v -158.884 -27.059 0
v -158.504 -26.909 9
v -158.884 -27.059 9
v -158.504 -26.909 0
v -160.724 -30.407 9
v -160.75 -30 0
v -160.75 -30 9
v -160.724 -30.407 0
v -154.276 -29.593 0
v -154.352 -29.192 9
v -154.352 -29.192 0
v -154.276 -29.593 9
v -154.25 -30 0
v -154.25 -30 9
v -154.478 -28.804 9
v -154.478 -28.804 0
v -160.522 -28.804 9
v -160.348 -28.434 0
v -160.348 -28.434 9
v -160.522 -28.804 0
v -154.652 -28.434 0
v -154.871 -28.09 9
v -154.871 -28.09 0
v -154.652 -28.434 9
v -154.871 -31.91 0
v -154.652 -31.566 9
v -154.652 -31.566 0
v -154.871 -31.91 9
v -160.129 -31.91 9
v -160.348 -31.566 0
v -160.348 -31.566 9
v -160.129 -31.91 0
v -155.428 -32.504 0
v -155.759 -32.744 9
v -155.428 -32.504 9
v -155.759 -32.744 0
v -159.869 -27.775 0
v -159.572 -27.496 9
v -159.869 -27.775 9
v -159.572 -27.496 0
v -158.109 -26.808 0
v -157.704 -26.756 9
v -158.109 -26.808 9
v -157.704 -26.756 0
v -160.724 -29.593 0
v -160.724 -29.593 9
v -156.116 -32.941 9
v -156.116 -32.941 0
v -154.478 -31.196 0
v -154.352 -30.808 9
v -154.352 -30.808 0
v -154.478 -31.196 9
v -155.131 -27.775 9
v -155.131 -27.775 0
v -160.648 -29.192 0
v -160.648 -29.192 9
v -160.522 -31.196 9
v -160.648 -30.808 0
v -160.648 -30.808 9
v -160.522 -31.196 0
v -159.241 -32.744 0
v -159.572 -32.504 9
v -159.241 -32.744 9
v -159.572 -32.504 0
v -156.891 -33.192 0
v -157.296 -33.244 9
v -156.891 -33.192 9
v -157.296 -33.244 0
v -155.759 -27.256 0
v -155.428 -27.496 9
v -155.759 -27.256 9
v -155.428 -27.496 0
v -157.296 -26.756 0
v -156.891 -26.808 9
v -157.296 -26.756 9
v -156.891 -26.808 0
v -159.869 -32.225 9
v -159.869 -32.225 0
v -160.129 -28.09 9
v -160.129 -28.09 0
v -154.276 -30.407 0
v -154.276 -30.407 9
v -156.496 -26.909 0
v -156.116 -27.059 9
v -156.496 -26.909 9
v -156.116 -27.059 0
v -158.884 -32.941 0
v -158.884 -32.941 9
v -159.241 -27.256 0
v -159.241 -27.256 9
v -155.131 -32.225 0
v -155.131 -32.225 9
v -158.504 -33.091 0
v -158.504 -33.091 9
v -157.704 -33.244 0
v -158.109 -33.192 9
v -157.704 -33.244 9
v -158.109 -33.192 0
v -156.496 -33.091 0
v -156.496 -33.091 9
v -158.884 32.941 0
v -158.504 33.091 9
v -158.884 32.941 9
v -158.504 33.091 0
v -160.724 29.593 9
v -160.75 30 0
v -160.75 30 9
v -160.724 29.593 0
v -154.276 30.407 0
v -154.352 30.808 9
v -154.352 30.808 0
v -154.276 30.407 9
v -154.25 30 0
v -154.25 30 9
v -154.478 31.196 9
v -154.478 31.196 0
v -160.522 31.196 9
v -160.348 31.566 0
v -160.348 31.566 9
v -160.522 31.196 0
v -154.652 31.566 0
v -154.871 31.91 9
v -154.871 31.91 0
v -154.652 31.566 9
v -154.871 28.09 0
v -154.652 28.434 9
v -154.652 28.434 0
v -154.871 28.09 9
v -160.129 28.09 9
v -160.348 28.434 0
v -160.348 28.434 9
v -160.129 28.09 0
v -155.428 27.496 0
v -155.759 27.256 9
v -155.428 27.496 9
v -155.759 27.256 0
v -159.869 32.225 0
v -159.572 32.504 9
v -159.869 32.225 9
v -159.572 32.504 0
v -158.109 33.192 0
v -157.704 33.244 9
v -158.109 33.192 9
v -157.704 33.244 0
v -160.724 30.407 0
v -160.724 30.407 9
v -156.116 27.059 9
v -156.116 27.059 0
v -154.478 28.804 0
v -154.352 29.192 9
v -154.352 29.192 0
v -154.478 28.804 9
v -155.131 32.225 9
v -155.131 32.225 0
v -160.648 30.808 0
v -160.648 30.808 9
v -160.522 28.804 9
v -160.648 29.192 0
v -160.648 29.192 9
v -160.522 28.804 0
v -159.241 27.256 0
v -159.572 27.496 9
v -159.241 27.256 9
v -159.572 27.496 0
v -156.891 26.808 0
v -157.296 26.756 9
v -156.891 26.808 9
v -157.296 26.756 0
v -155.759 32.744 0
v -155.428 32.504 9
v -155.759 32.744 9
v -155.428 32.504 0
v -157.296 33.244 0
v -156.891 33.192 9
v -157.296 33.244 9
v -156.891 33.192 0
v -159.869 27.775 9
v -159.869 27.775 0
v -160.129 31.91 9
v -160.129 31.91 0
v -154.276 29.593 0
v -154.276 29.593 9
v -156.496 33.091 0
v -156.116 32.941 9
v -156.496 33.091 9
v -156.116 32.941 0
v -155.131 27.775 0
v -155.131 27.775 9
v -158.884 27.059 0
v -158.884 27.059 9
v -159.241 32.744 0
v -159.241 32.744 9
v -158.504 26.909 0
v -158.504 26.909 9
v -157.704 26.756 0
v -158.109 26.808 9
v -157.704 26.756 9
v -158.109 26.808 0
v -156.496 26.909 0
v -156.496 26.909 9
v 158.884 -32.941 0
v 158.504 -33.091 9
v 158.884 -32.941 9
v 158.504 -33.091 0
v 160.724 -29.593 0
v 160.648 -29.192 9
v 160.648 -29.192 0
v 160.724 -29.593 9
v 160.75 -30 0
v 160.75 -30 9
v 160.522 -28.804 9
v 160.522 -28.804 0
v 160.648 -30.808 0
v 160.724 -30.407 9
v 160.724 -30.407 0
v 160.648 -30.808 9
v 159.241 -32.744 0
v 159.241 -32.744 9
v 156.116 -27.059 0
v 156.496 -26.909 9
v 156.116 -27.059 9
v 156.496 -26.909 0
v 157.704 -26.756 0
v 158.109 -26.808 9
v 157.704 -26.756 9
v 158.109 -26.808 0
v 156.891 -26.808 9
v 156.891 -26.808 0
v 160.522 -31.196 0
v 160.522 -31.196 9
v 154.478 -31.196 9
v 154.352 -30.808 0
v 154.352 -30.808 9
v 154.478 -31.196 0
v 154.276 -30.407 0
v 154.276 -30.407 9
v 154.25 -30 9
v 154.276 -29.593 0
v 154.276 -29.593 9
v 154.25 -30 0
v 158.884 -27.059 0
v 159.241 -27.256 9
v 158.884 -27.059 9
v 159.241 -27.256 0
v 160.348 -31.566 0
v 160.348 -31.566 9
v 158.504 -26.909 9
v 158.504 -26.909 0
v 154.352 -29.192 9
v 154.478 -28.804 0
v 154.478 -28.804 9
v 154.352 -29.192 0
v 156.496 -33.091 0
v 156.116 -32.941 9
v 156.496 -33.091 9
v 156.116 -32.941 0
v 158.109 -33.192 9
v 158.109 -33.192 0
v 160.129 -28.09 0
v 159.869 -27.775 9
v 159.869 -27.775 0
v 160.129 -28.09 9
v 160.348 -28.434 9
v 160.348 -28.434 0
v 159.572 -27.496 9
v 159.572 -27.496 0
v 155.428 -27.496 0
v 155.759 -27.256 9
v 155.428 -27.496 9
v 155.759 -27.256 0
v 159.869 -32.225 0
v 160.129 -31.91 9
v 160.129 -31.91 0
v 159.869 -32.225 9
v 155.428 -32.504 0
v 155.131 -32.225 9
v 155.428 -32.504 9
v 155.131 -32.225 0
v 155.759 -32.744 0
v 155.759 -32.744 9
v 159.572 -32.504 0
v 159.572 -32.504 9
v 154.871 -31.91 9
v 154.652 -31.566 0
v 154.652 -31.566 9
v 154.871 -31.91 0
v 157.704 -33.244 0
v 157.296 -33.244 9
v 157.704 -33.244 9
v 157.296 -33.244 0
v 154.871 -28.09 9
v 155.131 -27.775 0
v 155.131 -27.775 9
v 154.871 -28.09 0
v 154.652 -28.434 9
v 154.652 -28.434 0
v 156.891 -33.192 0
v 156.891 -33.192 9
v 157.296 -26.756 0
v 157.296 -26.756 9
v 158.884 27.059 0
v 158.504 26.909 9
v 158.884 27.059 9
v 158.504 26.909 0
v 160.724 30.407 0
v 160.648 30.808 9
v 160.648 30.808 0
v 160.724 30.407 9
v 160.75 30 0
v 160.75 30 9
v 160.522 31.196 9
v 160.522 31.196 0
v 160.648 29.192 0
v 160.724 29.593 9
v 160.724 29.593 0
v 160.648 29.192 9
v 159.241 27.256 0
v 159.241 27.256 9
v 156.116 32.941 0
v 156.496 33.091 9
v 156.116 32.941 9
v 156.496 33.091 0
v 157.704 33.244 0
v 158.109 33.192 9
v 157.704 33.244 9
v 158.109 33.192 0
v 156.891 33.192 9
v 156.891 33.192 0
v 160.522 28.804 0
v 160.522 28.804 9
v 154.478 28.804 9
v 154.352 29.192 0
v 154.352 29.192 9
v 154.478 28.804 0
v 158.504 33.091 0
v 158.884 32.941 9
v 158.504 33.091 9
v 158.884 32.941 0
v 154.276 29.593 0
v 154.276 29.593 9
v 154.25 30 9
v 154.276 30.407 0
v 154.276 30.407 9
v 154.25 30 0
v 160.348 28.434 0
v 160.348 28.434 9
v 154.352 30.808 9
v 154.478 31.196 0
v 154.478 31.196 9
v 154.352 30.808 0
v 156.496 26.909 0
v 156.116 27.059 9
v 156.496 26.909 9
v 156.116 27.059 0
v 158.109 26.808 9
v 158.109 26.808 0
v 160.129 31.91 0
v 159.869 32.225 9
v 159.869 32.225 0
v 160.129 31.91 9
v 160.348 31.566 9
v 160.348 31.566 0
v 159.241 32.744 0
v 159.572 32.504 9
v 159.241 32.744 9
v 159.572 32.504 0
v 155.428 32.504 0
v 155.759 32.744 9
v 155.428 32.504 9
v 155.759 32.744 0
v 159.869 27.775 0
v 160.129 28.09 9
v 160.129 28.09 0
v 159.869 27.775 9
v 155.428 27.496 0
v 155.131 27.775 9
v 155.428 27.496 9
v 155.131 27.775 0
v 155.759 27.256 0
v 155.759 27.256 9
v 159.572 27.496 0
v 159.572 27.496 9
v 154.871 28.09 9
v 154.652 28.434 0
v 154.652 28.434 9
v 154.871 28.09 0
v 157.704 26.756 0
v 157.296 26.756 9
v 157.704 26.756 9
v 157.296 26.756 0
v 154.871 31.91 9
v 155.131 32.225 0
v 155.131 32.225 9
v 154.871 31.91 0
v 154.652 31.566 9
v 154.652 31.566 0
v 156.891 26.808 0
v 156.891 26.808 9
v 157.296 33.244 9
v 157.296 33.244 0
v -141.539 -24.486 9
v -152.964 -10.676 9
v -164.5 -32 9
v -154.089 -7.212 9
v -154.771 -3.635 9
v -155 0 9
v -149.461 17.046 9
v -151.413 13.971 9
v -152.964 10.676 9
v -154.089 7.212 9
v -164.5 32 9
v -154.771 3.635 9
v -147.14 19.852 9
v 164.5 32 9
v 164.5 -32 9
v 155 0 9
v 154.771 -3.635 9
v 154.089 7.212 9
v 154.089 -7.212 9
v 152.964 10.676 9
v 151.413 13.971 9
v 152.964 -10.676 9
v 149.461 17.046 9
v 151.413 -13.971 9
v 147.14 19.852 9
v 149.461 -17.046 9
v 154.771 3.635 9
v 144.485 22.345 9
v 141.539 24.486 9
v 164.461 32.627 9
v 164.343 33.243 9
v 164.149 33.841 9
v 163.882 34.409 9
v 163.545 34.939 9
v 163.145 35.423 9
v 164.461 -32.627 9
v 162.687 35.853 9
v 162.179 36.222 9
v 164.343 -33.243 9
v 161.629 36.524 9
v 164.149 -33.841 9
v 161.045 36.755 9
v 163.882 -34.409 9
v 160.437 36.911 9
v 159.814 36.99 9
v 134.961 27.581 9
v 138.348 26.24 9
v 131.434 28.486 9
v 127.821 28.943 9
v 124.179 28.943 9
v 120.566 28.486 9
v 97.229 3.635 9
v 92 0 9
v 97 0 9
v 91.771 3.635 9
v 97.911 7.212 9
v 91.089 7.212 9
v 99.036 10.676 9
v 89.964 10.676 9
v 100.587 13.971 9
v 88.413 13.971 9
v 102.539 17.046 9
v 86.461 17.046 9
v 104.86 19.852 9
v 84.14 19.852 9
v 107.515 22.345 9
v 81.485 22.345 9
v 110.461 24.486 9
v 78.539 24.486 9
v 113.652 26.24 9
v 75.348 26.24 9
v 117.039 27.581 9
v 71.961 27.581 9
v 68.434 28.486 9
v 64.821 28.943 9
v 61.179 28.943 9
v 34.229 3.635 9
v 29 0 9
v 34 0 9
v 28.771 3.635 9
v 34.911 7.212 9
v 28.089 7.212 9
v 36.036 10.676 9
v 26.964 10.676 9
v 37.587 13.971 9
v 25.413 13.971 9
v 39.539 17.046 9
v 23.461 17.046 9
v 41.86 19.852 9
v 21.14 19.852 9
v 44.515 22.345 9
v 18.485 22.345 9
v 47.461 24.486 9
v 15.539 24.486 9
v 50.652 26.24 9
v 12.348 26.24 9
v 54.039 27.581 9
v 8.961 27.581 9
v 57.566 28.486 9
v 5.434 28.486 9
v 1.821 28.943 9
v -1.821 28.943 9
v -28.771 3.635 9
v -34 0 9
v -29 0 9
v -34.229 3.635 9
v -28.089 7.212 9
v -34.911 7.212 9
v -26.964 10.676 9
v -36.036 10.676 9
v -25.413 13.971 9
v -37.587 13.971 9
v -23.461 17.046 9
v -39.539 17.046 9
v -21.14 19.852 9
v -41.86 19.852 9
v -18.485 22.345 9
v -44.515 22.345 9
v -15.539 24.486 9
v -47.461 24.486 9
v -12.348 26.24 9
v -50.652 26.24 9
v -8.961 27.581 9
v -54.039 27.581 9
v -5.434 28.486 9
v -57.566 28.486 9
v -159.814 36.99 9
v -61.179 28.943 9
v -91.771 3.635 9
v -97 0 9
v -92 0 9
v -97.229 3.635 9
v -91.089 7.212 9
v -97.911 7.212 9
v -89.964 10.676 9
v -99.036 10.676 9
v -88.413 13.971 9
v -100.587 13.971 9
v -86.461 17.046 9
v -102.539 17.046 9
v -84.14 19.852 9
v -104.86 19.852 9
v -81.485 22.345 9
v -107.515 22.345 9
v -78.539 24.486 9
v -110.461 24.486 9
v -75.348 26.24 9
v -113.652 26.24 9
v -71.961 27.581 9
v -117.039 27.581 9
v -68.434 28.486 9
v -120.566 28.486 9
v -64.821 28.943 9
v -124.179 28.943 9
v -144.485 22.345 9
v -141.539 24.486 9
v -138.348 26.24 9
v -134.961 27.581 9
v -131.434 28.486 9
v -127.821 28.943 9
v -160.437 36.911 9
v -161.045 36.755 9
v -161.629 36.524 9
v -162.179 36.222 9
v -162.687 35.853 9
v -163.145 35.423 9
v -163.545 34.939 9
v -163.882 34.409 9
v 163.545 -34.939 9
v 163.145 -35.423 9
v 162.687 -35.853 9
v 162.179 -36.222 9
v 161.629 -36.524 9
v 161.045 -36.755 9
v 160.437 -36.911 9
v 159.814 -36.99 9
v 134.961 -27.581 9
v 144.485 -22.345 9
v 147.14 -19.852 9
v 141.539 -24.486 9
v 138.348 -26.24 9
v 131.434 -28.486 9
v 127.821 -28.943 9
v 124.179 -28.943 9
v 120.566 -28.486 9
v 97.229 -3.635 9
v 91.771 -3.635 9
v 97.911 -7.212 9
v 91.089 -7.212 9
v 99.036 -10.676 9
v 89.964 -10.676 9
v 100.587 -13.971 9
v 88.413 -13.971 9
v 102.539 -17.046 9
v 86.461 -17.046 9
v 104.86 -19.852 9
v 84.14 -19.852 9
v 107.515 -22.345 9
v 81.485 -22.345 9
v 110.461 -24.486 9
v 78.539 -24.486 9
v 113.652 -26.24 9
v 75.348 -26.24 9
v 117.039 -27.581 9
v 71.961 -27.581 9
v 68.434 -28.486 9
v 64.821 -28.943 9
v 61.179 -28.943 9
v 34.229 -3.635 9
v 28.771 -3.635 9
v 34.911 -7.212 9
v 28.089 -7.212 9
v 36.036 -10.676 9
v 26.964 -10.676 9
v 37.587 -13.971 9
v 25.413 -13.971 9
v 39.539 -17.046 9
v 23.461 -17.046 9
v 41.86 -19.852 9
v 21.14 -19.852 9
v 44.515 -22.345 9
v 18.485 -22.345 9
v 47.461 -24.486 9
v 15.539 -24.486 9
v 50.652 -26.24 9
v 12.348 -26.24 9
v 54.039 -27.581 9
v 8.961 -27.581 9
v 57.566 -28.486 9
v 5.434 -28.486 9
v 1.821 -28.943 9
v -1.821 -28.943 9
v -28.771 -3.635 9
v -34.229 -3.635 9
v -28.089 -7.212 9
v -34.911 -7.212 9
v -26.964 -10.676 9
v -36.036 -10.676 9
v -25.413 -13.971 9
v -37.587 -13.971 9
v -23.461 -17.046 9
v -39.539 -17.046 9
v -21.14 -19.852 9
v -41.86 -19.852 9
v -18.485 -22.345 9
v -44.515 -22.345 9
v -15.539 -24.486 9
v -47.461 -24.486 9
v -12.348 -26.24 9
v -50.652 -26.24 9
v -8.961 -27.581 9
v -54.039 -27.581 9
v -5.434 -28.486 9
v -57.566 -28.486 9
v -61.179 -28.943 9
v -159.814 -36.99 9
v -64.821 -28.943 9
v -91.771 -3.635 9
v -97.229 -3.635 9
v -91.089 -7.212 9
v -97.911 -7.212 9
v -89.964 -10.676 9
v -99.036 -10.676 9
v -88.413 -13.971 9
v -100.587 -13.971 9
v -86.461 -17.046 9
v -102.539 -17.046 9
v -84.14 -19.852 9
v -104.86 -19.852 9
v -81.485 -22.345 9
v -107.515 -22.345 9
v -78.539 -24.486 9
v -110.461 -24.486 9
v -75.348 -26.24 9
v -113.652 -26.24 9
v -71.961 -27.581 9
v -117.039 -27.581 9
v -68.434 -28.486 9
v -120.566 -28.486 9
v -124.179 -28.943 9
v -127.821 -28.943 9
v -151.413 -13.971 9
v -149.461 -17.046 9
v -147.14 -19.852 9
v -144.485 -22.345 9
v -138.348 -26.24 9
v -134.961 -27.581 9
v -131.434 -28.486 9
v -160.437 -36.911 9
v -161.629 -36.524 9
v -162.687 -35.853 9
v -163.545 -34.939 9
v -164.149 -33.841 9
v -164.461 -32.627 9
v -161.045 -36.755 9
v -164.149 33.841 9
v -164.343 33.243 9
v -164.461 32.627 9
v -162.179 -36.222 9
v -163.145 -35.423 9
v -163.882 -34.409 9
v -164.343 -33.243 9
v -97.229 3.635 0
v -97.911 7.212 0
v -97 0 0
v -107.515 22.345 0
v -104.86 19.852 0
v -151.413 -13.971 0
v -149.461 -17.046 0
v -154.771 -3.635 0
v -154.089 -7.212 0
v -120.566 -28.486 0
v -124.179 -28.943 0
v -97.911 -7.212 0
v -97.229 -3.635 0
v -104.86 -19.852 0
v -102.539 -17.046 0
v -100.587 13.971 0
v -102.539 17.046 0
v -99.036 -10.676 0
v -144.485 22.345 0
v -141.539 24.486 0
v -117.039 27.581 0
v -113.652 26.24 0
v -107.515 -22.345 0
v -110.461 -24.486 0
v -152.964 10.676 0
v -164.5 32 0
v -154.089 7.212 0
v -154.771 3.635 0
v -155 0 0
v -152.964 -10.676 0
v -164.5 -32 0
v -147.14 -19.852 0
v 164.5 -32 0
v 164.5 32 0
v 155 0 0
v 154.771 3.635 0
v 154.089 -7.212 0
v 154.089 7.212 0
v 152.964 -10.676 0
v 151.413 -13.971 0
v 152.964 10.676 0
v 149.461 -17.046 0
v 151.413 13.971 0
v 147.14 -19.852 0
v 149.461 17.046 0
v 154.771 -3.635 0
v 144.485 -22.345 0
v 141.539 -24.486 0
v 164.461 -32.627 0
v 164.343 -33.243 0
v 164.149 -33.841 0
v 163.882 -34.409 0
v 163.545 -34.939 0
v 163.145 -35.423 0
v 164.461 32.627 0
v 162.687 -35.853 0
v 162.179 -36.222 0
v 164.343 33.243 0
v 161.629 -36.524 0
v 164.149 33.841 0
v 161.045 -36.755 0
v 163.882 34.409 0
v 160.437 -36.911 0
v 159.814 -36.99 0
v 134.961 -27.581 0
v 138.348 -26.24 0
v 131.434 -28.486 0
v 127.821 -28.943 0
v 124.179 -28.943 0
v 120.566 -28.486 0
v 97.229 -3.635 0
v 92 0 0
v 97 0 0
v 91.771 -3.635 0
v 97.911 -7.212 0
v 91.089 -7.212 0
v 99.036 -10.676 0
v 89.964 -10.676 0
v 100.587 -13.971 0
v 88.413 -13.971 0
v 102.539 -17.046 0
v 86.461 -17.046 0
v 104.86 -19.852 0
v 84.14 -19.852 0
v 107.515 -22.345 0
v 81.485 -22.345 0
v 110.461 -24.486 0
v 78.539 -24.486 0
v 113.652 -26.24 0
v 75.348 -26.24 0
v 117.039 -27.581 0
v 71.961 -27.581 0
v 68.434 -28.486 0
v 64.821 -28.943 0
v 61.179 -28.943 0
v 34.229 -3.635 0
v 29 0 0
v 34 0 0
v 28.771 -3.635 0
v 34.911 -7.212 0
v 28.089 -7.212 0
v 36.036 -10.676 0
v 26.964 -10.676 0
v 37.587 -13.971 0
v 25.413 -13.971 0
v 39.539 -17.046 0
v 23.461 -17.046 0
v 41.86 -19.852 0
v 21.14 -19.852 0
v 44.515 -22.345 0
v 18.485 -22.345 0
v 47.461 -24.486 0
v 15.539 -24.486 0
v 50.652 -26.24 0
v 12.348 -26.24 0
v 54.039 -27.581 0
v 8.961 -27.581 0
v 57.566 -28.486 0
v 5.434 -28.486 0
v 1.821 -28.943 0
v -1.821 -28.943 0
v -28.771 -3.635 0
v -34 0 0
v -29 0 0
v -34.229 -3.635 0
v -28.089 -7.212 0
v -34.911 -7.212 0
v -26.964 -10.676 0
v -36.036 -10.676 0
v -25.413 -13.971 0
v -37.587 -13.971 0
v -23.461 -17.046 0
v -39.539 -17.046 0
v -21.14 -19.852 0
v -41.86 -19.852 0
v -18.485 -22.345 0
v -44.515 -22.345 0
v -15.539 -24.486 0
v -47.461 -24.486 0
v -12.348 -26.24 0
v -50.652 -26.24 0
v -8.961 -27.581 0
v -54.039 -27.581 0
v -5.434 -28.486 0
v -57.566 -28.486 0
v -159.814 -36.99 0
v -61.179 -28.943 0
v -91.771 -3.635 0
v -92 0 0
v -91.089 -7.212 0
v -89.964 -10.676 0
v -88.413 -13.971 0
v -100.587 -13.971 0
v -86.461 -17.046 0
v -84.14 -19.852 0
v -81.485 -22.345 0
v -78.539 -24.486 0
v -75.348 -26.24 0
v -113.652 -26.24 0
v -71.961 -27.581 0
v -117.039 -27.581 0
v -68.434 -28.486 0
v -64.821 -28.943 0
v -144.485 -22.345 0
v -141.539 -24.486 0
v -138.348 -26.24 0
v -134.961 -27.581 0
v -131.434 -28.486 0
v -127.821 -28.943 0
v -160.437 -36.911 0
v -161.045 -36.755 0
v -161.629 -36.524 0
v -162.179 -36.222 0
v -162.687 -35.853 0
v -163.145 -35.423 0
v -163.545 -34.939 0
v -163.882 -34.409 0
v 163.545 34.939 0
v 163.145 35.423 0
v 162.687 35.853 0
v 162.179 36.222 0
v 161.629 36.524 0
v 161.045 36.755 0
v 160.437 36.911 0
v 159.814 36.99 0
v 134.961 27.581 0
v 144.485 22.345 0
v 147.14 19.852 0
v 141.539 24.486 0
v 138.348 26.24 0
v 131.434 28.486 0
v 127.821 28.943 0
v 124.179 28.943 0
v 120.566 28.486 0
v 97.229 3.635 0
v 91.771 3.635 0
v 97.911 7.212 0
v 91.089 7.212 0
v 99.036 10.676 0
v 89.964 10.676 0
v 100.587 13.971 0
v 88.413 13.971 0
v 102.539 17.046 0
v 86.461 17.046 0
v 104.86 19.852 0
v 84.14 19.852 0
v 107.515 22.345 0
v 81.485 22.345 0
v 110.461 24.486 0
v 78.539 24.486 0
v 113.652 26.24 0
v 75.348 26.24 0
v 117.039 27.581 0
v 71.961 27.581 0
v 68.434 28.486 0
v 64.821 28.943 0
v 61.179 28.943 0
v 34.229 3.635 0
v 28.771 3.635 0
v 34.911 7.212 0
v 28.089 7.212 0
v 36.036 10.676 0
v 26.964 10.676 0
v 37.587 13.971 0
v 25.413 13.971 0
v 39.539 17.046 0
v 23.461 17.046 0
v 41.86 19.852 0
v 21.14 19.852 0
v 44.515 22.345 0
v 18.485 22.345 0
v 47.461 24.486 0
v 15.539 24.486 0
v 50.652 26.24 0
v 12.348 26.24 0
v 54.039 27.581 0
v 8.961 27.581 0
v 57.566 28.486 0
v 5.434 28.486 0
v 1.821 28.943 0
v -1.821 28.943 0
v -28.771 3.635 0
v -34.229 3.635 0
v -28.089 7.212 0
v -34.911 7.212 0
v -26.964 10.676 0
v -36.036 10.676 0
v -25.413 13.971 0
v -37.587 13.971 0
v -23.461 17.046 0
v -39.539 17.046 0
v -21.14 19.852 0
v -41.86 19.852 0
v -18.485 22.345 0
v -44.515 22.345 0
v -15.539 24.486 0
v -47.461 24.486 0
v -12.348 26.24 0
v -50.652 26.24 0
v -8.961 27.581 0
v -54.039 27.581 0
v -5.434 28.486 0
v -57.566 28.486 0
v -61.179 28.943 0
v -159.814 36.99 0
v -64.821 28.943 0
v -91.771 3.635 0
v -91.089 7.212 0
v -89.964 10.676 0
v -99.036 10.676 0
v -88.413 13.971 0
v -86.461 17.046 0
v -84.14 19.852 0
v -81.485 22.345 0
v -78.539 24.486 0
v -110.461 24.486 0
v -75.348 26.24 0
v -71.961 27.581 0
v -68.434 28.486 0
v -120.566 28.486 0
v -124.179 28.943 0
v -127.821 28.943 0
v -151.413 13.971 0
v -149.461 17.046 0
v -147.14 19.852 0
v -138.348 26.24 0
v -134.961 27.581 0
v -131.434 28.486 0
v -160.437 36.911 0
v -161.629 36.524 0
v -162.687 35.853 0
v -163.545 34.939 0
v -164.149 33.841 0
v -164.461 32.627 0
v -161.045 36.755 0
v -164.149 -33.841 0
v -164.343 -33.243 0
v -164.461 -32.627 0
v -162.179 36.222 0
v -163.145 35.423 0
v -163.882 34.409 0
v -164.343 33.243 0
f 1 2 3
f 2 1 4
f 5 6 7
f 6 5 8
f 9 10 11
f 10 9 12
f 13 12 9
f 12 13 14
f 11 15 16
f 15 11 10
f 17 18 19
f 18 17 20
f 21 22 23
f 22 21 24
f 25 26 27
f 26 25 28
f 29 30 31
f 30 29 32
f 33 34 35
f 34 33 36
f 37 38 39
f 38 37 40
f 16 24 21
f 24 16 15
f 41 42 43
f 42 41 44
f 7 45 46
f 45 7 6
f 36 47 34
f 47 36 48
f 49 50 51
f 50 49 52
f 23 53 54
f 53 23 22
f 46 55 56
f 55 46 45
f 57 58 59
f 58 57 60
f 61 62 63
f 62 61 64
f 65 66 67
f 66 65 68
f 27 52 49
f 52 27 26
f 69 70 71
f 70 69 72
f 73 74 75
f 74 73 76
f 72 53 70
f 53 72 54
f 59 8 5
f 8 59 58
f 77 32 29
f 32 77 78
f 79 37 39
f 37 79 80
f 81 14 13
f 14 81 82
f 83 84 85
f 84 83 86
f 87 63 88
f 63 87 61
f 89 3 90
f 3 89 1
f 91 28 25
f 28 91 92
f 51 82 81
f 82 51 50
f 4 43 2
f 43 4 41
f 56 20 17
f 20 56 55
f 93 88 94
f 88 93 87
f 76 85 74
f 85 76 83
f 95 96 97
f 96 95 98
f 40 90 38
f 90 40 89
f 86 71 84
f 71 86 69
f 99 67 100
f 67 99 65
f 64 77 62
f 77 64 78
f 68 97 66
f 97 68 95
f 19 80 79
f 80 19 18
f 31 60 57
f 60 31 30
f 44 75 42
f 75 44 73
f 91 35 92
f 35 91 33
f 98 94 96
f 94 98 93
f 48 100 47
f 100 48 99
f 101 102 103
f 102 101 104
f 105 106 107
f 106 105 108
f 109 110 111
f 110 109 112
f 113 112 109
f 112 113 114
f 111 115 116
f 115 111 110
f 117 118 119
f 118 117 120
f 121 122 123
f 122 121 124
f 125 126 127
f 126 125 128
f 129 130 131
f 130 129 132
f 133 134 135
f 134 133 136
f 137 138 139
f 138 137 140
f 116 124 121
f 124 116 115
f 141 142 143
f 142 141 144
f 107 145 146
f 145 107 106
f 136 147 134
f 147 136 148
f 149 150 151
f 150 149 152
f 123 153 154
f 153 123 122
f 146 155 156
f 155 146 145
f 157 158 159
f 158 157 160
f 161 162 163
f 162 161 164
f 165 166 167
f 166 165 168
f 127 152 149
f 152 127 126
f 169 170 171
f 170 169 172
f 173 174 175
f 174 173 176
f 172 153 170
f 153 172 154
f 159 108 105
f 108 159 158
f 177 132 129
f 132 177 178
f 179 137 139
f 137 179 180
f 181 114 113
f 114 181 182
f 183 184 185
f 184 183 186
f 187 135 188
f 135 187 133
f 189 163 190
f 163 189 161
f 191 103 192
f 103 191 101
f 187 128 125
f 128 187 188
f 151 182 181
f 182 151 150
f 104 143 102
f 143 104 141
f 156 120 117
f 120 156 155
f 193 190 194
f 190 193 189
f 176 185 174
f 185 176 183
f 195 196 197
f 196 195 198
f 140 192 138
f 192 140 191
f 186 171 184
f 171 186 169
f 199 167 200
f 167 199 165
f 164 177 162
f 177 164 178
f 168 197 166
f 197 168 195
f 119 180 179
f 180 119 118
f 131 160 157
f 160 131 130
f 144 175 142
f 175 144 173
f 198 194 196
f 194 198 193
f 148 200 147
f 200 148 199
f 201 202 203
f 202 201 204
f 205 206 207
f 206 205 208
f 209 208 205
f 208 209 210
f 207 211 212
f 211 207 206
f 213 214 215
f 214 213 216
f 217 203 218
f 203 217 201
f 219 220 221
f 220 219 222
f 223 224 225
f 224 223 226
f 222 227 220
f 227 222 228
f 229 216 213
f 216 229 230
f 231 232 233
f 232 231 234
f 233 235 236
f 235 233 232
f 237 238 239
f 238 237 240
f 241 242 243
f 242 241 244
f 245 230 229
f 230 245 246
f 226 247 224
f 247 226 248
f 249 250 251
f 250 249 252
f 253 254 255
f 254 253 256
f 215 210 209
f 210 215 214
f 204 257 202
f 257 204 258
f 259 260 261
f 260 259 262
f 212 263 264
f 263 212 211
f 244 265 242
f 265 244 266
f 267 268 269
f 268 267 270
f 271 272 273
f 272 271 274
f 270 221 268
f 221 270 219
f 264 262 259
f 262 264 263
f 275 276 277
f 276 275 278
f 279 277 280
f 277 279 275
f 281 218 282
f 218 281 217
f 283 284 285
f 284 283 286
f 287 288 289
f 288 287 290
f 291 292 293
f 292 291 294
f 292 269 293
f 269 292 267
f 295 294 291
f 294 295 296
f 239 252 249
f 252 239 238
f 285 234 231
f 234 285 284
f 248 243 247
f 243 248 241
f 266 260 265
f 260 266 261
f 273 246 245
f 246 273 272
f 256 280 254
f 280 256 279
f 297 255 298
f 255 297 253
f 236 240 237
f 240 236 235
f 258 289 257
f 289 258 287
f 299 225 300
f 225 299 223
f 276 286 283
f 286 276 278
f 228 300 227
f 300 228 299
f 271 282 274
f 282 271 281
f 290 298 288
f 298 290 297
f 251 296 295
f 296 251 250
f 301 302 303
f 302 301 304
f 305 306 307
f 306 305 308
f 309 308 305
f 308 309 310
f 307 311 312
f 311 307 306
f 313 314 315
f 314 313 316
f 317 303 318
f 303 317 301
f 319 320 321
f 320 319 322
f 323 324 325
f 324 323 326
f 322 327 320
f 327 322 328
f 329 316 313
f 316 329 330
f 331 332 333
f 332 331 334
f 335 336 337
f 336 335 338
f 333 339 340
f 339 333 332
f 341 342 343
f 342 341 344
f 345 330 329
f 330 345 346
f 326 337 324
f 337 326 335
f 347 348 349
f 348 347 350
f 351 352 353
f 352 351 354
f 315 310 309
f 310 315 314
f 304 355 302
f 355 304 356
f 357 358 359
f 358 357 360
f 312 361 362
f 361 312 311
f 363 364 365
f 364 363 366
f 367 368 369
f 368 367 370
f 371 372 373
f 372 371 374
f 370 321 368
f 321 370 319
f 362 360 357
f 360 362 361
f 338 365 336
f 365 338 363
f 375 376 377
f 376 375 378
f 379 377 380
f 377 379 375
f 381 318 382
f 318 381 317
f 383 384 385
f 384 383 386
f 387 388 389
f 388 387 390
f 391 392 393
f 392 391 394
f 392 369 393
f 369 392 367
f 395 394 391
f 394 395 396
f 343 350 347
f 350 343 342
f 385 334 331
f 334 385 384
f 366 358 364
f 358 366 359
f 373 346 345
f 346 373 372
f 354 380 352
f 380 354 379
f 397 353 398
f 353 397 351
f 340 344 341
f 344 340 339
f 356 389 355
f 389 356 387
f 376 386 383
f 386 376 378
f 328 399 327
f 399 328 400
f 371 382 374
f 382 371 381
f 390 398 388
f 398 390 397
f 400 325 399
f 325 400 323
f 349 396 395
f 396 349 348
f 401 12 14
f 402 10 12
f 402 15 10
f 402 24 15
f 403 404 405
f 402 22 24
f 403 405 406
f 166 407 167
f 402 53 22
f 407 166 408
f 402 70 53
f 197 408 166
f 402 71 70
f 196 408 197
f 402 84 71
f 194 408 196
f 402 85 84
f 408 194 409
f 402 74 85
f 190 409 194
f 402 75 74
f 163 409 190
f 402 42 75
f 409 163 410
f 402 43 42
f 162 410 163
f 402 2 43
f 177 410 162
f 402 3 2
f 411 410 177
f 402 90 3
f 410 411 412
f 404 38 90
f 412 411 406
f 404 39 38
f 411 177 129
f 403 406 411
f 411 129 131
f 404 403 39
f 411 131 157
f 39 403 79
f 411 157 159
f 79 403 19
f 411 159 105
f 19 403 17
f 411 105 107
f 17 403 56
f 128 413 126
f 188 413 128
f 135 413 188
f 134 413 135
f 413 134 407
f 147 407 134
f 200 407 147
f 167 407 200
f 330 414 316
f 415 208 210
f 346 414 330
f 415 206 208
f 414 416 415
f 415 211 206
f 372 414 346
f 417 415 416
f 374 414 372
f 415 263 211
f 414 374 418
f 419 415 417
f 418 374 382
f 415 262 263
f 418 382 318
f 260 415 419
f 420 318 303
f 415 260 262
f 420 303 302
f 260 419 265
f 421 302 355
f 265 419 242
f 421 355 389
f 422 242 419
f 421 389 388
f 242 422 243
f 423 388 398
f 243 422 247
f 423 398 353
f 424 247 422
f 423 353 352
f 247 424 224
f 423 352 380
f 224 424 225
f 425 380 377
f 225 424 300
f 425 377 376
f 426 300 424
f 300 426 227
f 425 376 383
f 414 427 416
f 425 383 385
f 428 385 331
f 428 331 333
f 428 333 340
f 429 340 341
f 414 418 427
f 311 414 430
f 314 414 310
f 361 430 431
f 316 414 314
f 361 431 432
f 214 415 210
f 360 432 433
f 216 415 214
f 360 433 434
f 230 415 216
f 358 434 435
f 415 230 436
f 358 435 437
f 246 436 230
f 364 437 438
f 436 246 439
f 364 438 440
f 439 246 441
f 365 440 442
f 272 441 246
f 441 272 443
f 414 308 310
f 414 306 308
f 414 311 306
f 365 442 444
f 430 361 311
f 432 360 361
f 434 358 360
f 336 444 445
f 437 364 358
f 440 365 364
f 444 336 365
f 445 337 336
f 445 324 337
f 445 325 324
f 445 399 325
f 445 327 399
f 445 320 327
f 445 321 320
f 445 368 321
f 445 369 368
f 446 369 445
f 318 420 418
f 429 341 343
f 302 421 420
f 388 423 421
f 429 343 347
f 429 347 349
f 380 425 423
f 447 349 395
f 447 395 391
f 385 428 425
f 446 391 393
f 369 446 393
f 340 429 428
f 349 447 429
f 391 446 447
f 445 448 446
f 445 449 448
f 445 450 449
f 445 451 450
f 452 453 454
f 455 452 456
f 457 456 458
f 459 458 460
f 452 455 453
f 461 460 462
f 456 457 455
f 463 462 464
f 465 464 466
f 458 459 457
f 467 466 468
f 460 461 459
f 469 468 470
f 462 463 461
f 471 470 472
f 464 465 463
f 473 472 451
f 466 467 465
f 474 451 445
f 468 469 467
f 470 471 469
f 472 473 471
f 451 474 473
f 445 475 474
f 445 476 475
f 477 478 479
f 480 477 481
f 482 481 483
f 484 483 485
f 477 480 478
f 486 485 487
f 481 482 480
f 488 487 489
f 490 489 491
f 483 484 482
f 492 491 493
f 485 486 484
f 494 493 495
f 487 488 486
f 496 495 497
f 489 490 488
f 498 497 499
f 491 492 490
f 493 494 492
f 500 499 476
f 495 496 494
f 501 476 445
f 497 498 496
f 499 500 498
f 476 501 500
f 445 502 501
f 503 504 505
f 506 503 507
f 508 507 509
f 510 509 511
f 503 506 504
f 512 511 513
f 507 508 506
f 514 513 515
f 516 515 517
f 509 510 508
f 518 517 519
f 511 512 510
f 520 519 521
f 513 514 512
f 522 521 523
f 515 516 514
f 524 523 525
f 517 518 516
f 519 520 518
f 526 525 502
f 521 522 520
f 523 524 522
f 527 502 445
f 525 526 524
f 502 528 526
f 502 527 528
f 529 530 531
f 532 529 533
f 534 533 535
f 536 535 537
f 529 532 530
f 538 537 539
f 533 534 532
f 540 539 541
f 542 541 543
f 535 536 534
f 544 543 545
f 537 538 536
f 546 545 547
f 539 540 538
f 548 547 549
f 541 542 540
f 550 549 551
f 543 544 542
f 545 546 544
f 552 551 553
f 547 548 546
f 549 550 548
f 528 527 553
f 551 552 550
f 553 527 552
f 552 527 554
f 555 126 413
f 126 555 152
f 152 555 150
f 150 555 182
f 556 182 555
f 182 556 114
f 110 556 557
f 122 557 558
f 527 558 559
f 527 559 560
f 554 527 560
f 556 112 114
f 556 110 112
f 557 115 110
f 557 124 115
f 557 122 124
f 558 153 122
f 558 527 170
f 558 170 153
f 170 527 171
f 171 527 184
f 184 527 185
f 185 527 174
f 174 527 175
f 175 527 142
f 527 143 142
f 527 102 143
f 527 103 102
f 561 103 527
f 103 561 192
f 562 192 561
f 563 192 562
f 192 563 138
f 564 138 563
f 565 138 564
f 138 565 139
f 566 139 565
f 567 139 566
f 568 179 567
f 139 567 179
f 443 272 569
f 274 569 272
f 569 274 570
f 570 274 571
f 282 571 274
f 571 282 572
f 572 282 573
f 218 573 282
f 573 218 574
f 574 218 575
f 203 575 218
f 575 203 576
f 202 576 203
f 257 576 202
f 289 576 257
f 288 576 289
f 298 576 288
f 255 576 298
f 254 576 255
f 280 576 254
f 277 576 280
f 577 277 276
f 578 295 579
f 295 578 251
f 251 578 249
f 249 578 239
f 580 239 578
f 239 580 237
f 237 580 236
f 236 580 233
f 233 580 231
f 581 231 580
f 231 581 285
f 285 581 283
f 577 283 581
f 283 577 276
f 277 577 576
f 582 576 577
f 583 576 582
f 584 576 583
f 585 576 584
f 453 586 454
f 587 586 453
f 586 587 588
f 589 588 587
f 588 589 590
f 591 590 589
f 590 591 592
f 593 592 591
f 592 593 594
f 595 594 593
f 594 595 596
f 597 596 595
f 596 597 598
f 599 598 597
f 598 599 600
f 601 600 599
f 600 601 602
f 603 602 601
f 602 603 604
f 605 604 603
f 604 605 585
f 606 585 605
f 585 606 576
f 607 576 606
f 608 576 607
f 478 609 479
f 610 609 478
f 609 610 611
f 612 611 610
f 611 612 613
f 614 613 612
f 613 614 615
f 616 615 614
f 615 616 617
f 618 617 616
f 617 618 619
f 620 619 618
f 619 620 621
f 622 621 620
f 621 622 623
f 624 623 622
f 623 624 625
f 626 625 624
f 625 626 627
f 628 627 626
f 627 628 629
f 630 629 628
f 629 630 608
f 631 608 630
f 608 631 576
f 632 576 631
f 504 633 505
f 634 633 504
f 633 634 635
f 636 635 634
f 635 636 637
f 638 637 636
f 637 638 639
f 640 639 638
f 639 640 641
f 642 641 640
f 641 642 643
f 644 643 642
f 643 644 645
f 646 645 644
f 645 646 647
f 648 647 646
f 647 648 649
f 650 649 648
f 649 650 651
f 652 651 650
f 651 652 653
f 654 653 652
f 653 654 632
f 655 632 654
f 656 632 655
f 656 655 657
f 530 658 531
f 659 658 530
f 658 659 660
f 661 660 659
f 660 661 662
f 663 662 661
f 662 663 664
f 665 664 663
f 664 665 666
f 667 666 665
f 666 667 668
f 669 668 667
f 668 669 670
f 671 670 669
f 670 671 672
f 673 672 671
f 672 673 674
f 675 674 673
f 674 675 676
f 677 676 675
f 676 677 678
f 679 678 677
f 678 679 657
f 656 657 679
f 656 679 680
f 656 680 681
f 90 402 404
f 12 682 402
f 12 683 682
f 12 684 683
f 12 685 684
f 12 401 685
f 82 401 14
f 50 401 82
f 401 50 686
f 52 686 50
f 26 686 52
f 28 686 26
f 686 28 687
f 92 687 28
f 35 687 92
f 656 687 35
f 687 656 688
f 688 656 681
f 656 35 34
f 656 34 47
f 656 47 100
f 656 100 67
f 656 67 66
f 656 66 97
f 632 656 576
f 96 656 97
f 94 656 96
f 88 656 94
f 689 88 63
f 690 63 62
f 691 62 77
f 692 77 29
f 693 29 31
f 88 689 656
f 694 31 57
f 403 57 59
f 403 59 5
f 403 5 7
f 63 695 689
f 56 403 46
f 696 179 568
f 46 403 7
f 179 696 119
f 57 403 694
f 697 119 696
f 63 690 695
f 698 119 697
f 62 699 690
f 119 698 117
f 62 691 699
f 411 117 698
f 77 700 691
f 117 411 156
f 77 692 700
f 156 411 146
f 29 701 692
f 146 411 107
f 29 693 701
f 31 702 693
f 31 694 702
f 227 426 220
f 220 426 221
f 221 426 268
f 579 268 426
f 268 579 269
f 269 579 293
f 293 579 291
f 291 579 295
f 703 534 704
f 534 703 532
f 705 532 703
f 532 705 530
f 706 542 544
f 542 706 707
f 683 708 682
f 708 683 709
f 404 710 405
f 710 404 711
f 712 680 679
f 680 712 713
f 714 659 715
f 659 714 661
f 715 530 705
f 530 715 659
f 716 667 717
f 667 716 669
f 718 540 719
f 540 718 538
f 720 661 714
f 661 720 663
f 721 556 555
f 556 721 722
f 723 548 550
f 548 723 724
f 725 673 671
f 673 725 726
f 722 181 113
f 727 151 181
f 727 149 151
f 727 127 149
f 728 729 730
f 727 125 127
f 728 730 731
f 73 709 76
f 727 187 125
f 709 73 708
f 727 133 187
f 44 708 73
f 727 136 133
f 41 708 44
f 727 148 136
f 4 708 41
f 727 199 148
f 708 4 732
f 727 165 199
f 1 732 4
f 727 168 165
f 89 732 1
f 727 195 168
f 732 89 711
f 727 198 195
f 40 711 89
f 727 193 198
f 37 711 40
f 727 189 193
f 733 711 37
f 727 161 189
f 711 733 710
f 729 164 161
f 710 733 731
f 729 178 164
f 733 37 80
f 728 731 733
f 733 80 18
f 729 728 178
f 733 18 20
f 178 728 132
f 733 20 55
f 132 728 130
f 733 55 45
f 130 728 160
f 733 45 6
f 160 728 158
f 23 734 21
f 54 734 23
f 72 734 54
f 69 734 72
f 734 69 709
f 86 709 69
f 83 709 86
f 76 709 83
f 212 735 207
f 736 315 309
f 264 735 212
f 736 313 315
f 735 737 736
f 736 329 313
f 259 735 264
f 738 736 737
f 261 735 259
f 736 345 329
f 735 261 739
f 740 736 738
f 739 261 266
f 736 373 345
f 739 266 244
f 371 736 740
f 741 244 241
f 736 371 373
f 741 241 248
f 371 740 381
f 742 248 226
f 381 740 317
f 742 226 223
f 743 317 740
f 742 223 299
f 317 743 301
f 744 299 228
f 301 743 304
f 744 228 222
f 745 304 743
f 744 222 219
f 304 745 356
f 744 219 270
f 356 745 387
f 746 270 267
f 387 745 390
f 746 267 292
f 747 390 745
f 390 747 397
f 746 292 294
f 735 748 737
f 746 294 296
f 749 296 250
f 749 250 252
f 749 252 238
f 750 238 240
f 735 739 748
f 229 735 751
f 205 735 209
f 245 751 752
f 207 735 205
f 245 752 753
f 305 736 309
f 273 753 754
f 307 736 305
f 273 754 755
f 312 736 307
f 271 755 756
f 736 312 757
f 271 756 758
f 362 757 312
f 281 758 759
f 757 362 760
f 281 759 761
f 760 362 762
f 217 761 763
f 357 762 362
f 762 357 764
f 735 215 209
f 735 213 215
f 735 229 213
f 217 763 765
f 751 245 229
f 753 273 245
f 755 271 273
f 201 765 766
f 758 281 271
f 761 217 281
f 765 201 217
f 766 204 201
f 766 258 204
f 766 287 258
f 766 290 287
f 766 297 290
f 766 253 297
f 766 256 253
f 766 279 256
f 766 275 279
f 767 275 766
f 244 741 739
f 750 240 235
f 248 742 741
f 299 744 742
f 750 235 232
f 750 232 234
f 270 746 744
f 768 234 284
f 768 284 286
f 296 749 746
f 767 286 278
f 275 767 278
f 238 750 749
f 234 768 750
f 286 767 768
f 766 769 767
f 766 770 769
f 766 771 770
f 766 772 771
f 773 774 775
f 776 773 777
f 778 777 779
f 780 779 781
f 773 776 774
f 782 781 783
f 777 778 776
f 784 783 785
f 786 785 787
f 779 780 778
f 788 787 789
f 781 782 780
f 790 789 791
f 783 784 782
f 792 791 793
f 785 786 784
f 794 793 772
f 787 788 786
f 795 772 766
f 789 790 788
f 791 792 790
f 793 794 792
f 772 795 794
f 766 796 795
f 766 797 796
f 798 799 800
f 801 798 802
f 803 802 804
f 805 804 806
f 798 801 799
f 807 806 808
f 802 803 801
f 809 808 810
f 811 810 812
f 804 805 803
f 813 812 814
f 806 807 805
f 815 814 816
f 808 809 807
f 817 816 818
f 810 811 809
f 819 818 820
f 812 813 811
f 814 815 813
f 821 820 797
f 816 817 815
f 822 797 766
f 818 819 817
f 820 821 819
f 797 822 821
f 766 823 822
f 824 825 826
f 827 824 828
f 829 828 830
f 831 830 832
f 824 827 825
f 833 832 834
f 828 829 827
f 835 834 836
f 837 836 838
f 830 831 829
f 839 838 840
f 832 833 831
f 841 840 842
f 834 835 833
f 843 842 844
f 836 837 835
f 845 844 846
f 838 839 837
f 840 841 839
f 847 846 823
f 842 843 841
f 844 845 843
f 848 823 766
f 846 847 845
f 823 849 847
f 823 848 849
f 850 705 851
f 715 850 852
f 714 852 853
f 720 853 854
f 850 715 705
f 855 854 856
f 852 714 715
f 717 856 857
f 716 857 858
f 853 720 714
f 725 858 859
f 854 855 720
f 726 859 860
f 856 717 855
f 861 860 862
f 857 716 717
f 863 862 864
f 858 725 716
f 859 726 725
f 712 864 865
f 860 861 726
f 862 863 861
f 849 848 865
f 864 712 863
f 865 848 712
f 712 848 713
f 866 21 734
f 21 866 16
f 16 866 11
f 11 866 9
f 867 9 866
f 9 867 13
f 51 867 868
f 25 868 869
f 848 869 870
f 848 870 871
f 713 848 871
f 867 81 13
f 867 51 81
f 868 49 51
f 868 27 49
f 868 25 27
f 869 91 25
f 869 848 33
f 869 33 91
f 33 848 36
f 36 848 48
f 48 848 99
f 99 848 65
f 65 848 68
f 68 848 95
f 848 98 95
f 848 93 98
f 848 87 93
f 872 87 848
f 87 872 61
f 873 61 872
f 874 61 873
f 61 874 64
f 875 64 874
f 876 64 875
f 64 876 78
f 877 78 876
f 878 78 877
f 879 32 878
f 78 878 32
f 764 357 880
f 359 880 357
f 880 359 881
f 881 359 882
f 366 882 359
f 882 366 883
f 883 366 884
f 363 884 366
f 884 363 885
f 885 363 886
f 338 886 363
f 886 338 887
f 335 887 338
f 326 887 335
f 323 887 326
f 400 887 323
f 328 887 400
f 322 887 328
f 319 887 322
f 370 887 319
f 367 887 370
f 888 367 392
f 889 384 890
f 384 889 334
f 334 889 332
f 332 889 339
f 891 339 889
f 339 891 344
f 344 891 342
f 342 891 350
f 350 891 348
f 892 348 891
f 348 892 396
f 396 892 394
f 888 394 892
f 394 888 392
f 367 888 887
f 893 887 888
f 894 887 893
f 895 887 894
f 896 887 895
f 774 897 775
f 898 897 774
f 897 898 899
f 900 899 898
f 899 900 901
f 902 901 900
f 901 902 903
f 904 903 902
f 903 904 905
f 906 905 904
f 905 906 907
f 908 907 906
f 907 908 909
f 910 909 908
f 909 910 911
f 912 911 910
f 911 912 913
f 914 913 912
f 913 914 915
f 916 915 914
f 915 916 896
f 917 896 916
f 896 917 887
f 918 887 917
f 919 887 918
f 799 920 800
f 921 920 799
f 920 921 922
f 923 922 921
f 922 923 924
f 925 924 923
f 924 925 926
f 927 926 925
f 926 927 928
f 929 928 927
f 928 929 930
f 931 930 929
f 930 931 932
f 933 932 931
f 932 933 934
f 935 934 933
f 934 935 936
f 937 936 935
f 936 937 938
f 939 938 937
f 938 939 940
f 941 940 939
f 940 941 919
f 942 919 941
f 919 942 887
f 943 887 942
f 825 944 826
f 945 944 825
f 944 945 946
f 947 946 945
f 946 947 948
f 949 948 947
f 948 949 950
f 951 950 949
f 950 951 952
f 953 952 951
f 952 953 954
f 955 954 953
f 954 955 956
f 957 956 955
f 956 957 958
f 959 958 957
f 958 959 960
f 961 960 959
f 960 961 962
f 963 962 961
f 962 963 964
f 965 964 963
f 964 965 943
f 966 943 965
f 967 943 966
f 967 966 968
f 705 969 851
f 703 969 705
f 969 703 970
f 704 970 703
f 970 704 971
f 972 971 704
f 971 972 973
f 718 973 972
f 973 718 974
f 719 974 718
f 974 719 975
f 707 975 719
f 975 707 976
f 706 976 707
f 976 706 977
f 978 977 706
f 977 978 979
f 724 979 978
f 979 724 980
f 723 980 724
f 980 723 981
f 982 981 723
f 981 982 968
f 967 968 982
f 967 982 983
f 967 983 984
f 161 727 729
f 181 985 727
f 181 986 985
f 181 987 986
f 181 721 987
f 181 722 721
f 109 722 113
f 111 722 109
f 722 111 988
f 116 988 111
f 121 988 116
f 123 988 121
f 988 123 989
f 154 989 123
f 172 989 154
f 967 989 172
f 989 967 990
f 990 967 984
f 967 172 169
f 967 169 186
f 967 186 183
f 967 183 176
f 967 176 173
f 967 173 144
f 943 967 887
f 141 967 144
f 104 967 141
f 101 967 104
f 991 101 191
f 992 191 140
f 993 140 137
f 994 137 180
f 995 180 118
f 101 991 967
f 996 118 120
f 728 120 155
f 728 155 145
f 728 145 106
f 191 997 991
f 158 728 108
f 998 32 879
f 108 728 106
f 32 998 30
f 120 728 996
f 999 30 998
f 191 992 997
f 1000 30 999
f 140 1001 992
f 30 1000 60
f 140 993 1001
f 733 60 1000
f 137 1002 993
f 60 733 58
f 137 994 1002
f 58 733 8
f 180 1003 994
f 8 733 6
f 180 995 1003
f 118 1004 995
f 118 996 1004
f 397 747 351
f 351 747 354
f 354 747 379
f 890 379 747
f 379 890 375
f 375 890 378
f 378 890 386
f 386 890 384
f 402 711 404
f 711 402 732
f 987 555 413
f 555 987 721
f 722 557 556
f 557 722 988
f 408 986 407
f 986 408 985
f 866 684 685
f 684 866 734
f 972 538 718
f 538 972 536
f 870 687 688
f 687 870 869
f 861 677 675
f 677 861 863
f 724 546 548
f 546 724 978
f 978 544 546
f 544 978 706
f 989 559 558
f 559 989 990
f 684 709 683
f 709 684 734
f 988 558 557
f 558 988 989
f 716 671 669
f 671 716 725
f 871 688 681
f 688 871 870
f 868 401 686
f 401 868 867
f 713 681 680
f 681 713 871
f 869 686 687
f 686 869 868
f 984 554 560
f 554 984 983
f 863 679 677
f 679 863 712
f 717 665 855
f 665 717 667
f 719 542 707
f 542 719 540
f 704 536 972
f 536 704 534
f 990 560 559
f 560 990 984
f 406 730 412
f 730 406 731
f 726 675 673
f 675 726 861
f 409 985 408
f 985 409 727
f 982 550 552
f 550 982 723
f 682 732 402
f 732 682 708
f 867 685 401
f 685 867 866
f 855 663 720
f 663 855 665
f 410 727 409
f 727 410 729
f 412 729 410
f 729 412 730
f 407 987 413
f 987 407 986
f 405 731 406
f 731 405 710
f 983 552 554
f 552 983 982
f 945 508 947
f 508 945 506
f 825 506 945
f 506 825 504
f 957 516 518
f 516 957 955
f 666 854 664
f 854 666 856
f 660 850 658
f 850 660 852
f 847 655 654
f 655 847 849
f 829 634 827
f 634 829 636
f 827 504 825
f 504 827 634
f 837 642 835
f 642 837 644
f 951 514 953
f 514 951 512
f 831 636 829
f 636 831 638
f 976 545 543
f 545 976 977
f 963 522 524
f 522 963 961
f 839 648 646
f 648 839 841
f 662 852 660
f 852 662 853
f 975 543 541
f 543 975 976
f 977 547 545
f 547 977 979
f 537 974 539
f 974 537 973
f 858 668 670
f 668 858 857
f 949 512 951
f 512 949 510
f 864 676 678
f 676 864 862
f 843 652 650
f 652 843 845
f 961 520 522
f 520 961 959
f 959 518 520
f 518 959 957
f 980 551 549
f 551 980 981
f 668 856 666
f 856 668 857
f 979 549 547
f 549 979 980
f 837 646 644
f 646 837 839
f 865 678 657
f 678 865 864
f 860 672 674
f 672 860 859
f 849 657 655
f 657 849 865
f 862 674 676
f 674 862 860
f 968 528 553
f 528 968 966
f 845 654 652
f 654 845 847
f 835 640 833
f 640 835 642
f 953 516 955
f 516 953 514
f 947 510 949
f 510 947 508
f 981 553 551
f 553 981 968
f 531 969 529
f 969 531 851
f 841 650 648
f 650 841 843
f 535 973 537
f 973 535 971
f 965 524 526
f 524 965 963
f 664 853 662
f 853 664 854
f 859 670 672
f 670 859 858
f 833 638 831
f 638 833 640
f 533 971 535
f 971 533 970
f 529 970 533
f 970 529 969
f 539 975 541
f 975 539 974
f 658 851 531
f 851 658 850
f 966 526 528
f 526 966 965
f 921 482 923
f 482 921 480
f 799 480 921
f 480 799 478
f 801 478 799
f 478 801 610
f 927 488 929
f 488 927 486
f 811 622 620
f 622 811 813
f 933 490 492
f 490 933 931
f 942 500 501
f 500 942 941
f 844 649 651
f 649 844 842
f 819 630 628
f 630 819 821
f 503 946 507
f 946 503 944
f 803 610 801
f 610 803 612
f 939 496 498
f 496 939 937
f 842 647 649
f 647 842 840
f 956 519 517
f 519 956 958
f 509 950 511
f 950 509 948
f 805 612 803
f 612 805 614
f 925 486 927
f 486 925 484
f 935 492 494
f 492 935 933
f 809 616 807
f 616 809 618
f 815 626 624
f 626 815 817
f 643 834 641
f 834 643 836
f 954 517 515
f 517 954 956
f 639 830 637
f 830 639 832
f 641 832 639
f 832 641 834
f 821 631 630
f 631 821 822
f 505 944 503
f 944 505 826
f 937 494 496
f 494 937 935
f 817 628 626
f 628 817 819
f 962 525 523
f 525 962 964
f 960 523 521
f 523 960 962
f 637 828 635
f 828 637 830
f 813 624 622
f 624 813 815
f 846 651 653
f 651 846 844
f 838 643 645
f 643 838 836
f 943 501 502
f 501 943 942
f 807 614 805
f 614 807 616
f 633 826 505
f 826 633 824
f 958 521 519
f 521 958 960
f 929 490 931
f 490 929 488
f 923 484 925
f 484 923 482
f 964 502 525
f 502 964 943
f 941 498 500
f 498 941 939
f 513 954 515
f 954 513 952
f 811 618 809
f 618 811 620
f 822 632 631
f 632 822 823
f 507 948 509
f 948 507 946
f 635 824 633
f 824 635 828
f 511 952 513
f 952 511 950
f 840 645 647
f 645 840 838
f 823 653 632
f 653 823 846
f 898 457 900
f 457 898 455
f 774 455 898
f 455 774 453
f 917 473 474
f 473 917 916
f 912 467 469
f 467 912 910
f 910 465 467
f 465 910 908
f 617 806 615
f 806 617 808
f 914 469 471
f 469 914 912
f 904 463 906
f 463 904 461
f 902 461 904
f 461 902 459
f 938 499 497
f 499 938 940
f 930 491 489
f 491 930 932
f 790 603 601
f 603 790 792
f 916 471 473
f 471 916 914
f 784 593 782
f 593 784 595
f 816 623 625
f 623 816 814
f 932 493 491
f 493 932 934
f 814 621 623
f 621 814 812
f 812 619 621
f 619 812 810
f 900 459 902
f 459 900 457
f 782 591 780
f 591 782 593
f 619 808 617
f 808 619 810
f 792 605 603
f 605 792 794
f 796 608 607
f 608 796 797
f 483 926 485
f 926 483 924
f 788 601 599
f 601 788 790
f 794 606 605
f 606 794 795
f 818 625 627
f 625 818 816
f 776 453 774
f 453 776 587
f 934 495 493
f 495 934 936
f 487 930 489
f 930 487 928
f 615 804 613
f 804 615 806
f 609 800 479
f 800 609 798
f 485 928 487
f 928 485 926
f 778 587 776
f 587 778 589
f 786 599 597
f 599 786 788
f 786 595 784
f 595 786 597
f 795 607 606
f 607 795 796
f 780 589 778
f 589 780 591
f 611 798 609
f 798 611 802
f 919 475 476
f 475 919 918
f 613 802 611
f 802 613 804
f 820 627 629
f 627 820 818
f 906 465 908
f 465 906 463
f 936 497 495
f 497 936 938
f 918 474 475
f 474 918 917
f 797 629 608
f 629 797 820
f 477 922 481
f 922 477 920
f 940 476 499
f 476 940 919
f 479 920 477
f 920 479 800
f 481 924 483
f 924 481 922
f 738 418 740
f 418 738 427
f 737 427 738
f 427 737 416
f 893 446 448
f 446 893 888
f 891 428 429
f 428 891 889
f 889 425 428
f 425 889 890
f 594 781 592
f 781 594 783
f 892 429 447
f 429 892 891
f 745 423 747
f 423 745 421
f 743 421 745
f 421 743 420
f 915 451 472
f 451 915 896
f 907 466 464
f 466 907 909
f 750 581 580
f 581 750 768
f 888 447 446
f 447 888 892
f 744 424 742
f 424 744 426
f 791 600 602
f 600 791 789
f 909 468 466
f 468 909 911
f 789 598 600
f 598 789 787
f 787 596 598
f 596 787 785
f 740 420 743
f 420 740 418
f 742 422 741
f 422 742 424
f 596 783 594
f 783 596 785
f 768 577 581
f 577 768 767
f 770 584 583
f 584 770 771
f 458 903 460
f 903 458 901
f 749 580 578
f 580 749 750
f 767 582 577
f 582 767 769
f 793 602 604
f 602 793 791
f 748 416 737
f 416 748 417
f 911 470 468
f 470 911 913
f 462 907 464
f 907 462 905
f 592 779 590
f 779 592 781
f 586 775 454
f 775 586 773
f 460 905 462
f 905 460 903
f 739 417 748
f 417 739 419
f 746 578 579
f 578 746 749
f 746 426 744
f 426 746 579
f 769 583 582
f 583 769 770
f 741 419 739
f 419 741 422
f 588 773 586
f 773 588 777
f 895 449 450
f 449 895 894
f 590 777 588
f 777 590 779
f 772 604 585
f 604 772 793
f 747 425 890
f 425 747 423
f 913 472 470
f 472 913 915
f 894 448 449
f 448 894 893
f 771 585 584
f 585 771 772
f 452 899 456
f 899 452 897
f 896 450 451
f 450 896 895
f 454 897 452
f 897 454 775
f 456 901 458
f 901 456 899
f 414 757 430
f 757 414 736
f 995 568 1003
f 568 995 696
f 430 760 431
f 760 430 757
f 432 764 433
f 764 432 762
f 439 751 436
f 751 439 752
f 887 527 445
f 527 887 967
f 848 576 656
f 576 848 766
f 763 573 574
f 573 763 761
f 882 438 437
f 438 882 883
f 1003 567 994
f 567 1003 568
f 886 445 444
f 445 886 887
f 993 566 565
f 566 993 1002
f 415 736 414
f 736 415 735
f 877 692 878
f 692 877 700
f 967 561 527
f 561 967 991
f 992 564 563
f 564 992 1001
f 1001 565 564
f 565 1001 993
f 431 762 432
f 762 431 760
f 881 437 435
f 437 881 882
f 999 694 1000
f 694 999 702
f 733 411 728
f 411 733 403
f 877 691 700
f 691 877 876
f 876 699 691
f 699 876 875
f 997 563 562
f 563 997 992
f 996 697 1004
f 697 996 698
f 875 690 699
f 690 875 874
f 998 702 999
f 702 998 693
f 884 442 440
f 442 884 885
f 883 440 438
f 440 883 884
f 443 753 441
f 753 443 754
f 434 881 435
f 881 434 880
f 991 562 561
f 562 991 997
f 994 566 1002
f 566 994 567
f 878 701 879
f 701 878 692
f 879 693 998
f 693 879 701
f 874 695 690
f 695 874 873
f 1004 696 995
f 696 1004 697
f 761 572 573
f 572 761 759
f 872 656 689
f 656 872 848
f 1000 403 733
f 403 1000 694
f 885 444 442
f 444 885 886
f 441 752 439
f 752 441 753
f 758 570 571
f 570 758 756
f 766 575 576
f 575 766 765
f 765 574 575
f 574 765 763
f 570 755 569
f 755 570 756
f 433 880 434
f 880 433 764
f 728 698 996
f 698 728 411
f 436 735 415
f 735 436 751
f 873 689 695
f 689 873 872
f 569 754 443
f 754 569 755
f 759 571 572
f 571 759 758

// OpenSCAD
$fn = 50;

difference() {
	union() {
		hull() {
			translate(v = [-159.5, 32.0, 0]) {
				cylinder(h = 9, r = 5);
			}
			translate(v = [159.5, 32.0, 0]) {
				cylinder(h = 9, r = 5);
			}
			translate(v = [-159.5, -32.0, 0]) {
				cylinder(h = 9, r = 5);
			}
			translate(v = [159.5, -32.0, 0]) {
				cylinder(h = 9, r = 5);
			}
		}
	}
	union() {
		translate(v = [-157.5, -30.0, -100.0]) {
			cylinder(h = 200, r = 3.25);
		}
		translate(v = [-157.5, 30.0, -100.0]) {
			cylinder(h = 200, r = 3.25);
		}
		translate(v = [157.5, -30.0, -100.0]) {
			cylinder(h = 200, r = 3.25);
		}
		translate(v = [157.5, 30.0, -100.0]) {
			cylinder(h = 200, r = 3.25);
		}
		translate(v = [-157.5, -30.0, -100.0]) {
			cylinder(h = 200, r = 1.8);
		}
		translate(v = [-157.5, 30.0, -100.0]) {
			cylinder(h = 200, r = 1.8);
		}
		translate(v = [157.5, -30.0, -100.0]) {
			cylinder(h = 200, r = 1.8);
		}
		translate(v = [157.5, 30.0, -100.0]) {
			cylinder(h = 200, r = 1.8);
		}
		translate(v = [-126.0, 0, 0.0]) {
			cylinder(h = 9, r = 29.0);
		}
		translate(v = [-63.0, 0, 0.0]) {
			cylinder(h = 9, r = 29.0);
		}
		cylinder(h = 9, r = 29.0);
		translate(v = [63.0, 0, 0.0]) {
			cylinder(h = 9, r = 29.0);
		}
		translate(v = [126.0, 0, 0.0]) {
			cylinder(h = 9, r = 29.0);
		}
	}
}
